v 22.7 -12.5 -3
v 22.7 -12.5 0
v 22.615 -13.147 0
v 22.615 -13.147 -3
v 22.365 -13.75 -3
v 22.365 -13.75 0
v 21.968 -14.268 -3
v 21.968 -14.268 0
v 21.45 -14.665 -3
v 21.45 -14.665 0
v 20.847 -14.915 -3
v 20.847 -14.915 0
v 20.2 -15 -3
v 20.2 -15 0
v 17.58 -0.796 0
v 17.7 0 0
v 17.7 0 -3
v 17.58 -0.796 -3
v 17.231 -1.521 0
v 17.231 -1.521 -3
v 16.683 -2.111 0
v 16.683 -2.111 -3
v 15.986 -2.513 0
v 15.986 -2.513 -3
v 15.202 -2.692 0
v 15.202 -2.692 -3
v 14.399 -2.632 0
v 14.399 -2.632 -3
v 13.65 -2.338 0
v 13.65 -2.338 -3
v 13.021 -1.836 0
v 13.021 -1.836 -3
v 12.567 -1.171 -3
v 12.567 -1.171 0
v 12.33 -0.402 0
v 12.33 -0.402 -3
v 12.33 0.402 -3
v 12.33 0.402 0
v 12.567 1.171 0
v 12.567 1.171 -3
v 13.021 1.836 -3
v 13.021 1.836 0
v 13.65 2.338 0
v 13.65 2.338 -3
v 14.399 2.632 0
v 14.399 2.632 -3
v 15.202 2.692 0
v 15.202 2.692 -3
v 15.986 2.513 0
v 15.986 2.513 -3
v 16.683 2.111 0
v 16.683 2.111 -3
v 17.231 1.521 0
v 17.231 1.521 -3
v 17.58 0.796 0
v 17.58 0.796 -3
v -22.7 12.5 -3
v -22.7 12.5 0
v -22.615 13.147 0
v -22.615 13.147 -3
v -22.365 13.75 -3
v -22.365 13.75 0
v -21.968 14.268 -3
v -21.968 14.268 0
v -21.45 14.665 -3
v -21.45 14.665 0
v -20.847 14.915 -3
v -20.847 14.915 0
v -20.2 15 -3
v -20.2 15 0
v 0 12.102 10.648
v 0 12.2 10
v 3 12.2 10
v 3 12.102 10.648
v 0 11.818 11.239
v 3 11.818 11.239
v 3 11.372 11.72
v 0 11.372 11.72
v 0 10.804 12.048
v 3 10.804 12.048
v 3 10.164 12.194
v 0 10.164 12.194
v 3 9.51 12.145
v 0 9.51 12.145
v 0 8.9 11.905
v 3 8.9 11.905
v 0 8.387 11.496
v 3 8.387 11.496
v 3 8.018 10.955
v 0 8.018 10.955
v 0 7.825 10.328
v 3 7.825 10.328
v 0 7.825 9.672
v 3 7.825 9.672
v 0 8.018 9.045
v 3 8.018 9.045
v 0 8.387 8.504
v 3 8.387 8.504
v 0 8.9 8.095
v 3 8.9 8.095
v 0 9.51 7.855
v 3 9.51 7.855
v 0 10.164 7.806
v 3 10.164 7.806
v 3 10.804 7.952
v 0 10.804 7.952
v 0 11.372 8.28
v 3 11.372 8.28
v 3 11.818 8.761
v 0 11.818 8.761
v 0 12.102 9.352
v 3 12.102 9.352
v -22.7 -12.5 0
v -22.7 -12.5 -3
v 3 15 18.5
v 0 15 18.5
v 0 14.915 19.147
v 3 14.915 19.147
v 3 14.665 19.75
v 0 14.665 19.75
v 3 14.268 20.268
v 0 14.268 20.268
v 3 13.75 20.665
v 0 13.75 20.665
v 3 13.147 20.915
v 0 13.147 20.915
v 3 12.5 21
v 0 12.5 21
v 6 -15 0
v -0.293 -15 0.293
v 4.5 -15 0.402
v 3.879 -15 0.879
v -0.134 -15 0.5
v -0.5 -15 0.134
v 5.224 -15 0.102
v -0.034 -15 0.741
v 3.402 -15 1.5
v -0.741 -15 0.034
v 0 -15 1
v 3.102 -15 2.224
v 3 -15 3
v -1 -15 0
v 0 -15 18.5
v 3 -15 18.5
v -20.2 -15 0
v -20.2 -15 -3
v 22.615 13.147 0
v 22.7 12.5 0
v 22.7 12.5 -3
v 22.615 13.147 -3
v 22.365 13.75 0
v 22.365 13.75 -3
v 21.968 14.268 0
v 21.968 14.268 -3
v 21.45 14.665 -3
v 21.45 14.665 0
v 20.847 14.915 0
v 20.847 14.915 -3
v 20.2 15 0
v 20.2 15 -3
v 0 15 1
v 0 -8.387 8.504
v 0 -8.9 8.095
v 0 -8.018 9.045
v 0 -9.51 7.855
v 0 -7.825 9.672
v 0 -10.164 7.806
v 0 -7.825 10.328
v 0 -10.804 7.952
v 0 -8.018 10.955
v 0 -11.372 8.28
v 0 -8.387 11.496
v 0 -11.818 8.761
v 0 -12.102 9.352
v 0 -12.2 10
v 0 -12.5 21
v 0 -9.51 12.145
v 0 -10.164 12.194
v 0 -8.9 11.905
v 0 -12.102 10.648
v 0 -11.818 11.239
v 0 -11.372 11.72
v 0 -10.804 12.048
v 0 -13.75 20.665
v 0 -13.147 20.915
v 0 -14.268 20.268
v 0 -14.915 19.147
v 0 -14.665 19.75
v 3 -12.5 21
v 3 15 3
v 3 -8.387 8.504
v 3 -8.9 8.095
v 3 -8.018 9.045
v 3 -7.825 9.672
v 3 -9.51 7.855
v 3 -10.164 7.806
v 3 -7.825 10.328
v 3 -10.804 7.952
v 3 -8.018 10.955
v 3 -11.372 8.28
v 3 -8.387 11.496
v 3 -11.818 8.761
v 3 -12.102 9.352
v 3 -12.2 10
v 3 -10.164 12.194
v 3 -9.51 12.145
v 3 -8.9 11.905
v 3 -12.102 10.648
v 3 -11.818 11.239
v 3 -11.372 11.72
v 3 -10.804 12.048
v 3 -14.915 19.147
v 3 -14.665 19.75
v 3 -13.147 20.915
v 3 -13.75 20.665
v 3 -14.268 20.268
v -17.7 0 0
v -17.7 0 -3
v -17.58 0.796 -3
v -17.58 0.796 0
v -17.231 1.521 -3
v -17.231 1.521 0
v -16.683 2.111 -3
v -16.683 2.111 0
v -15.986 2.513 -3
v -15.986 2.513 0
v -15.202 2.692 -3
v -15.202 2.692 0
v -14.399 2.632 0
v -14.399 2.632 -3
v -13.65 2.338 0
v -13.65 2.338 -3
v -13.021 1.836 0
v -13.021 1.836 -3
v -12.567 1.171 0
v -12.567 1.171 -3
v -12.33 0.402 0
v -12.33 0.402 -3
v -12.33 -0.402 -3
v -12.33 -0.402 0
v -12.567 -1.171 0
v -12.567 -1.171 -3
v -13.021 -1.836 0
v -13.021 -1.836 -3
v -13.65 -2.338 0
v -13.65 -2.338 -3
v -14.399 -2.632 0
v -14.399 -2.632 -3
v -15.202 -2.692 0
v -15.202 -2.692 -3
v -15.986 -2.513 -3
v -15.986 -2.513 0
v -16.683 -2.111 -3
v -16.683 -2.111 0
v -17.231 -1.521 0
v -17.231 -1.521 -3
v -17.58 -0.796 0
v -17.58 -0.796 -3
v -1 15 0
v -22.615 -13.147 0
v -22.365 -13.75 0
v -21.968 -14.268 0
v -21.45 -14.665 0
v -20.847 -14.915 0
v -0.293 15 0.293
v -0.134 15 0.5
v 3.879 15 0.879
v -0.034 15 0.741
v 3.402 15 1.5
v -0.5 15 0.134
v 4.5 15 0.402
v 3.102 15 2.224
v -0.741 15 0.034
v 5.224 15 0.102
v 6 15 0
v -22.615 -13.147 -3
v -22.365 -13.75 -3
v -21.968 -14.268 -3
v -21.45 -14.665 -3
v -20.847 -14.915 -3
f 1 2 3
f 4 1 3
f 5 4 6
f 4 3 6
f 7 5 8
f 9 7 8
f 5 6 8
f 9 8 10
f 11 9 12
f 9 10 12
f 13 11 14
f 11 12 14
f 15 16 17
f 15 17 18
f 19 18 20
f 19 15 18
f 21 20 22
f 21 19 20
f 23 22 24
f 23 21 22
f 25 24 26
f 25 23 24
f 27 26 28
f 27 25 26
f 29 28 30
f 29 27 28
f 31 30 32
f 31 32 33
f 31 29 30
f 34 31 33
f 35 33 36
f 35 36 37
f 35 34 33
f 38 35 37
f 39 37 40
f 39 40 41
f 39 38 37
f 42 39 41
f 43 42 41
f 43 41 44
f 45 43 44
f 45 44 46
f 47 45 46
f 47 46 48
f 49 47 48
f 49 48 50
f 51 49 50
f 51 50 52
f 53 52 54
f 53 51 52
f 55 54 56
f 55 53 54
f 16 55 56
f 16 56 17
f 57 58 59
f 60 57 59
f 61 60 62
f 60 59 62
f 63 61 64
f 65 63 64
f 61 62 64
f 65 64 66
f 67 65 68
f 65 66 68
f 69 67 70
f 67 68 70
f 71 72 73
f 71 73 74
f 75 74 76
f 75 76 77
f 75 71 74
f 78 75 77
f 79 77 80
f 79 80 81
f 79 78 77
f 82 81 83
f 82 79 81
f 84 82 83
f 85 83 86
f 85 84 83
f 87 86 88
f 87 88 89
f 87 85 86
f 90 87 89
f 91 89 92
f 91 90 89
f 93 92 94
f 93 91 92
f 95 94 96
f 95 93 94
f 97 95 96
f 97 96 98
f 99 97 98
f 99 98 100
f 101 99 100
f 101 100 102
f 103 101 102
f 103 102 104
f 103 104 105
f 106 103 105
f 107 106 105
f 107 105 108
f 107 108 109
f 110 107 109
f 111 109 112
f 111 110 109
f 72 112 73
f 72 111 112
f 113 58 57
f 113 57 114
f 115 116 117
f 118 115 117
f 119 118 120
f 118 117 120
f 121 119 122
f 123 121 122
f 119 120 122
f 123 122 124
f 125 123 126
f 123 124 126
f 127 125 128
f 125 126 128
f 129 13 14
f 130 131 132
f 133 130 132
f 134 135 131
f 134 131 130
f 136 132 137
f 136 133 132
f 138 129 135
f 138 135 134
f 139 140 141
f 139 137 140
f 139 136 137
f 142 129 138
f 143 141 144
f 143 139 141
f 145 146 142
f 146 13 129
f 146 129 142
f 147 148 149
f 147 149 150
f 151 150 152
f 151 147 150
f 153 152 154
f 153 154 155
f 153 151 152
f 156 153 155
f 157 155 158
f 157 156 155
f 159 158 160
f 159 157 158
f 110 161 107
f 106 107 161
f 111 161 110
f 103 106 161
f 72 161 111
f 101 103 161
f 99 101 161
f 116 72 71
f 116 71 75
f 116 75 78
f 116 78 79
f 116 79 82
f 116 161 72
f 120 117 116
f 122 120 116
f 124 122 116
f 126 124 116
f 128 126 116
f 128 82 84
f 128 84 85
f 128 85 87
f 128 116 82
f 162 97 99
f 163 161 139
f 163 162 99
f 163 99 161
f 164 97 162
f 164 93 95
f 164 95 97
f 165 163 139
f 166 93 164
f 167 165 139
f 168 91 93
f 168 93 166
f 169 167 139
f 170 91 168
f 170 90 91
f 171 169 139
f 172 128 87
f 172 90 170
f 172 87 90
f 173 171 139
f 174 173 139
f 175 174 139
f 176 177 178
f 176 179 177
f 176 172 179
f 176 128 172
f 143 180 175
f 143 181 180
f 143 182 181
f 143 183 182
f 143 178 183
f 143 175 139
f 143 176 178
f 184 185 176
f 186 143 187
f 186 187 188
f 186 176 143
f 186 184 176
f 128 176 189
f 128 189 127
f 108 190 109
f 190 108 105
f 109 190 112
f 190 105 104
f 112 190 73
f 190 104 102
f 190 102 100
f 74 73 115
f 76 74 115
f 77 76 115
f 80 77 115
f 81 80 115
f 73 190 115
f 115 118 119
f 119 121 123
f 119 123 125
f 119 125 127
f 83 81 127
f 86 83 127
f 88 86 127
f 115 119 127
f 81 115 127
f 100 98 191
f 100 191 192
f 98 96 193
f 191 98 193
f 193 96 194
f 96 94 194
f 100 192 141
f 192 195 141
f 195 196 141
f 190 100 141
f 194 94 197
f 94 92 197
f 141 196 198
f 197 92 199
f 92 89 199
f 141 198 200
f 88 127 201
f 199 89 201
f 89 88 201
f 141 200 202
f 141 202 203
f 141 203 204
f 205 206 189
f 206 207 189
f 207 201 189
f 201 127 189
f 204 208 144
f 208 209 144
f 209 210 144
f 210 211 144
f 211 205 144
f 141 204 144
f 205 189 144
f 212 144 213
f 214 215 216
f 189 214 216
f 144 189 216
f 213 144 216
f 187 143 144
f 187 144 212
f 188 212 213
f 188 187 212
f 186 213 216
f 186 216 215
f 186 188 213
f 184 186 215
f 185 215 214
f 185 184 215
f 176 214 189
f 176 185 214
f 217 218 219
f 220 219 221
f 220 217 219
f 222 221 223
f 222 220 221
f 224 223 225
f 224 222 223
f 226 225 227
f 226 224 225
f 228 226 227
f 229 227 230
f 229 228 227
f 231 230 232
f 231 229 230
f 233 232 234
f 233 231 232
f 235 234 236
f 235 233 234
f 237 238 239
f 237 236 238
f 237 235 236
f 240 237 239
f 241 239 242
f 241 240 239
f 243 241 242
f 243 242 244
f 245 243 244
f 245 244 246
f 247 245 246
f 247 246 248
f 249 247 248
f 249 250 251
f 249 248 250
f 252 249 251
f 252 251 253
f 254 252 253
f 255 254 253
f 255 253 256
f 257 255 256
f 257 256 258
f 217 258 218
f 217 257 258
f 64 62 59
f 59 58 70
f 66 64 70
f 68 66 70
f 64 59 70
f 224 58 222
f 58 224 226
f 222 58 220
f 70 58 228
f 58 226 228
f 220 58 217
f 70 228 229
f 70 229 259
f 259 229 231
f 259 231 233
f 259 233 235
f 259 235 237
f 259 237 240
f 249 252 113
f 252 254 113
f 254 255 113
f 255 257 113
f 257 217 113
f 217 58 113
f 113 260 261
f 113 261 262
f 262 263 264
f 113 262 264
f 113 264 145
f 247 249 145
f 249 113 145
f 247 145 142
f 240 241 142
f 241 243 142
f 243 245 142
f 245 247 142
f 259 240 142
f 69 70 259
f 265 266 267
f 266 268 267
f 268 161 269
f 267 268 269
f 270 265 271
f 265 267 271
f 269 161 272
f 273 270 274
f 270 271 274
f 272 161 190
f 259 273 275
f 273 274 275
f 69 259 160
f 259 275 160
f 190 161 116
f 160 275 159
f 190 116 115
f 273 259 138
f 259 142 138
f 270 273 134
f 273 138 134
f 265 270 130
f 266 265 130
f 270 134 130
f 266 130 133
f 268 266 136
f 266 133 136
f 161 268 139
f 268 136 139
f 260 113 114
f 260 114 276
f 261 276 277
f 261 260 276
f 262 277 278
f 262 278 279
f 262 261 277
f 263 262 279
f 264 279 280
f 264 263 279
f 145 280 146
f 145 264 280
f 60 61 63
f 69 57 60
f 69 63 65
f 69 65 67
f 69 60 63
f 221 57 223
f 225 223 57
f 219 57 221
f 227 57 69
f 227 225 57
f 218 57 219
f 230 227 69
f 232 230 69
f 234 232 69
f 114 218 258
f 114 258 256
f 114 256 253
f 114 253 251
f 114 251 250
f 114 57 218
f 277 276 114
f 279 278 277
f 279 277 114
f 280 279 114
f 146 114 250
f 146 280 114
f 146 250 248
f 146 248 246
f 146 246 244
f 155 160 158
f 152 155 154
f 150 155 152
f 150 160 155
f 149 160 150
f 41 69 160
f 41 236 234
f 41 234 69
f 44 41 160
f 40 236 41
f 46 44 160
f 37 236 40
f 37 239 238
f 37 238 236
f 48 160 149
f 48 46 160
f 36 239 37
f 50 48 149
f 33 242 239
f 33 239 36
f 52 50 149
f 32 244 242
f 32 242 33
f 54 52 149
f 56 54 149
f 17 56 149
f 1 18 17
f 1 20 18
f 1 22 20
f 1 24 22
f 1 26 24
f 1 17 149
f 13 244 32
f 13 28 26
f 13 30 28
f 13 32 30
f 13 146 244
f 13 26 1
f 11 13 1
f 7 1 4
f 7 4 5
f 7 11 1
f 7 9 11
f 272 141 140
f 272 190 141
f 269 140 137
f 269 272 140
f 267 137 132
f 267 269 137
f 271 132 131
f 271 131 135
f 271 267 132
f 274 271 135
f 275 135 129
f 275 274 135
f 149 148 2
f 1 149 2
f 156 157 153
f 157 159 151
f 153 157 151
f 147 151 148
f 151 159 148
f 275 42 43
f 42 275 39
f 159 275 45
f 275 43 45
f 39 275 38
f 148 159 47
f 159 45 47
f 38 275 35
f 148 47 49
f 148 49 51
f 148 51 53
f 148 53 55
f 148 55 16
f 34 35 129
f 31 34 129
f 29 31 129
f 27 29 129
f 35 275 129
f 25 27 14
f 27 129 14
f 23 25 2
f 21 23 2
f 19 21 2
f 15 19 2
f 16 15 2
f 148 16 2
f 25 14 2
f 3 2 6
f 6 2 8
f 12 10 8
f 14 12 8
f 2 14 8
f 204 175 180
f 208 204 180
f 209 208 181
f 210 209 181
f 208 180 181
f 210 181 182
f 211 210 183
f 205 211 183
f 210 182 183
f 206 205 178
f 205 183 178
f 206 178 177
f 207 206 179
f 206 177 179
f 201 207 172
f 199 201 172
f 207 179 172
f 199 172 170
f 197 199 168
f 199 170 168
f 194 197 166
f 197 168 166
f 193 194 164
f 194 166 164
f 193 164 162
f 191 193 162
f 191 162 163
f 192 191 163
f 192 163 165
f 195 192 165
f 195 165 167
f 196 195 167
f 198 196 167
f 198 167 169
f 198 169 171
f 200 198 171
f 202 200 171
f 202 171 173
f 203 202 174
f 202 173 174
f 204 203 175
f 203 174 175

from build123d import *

# Parameters (mm, degrees)
PAD_DEPTH            = 3
PAD_MIRRORED_2_DEPTH = 3
SKETCH001_R          = 2.2
PAD001_DEPTH         = 3
FILLET_R             = 1
FILLET001_R          = 3


with BuildPart() as part:
    # Sketch → Pad (new body)
    with BuildSketch(Plane.XY):
        with BuildLine():
            Line((0, 0), (12.3, 0))
            ThreePointArc((17.7, 0), (15, 2.7), (12.3, 0))
            Line((17.7, 0), (22.7, 0))
            Line((22.7, 0), (22.7, 12.5))
            ThreePointArc((22.7, 12.5), (21.967767, 14.267767), (20.2, 15))
            Line((20.2, 15), (0, 15))
            Line((0, 15), (0, 0))
        make_face()
    pad = extrude(amount=-PAD_DEPTH)

    # Sketch Mirrored 2 → Pad Mirrored 2 (add)
    with BuildSketch(Plane(origin=(0, 0, 0), x_dir=(-1, 0, 0), z_dir=(0, 0, -1))):
        with BuildLine():
            Line((0, 0), (12.3, 0))
            ThreePointArc((17.7, 0), (15, 2.7), (12.3, 0))
            Line((17.7, 0), (22.7, 0))
            Line((22.7, 0), (22.7, 12.5))
            ThreePointArc((22.7, 12.5), (21.967767, 14.267767), (20.2, 15))
            Line((20.2, 15), (0, 15))
            Line((0, 15), (0, 0))
        make_face()
    pad_mirrored_2 = extrude(amount=PAD_MIRRORED_2_DEPTH)

    # Mirrored001: Pad, Pad Mirrored 2 across Sketch H_Axis
    add(pad.mirror(Plane.ZX))
    add(pad_mirrored_2.mirror(Plane.ZX))

    # Sketch001 → Pad001 (join)
    with BuildSketch(Plane.YZ):
        with BuildLine():
            Line((0, 0), (15, 0))
            Line((15, 0), (15, 18.5))
            ThreePointArc((15, 18.5), (14.267767, 20.267767), (12.5, 21))
            Line((12.5, 21), (0, 21))
            Line((0, 21), (0, 0))
        make_face()
        with Locations((10, 10)):
            Circle(SKETCH001_R, mode=Mode.SUBTRACT)
    pad001 = extrude(amount=PAD001_DEPTH)

    # Mirrored002: Pad001 across Sketch001 V_Axis
    add(pad001.mirror(Plane(origin=(0, 0, 0), x_dir=(1, 0, 0), z_dir=(0, 1, 0))))

    # Fillet
    fillet_edges = [part.edges().sort_by_distance(p)[0] for p in [
        (0, -7.5, 0),
    ]]
    fillet(fillet_edges, radius=FILLET_R)

    # Fillet001
    fillet001_edges = [part.edges().sort_by_distance(p)[0] for p in [
        (3, -7.5, 0),
    ]]
    fillet(fillet001_edges, radius=FILLET001_R)


solid = part.part
